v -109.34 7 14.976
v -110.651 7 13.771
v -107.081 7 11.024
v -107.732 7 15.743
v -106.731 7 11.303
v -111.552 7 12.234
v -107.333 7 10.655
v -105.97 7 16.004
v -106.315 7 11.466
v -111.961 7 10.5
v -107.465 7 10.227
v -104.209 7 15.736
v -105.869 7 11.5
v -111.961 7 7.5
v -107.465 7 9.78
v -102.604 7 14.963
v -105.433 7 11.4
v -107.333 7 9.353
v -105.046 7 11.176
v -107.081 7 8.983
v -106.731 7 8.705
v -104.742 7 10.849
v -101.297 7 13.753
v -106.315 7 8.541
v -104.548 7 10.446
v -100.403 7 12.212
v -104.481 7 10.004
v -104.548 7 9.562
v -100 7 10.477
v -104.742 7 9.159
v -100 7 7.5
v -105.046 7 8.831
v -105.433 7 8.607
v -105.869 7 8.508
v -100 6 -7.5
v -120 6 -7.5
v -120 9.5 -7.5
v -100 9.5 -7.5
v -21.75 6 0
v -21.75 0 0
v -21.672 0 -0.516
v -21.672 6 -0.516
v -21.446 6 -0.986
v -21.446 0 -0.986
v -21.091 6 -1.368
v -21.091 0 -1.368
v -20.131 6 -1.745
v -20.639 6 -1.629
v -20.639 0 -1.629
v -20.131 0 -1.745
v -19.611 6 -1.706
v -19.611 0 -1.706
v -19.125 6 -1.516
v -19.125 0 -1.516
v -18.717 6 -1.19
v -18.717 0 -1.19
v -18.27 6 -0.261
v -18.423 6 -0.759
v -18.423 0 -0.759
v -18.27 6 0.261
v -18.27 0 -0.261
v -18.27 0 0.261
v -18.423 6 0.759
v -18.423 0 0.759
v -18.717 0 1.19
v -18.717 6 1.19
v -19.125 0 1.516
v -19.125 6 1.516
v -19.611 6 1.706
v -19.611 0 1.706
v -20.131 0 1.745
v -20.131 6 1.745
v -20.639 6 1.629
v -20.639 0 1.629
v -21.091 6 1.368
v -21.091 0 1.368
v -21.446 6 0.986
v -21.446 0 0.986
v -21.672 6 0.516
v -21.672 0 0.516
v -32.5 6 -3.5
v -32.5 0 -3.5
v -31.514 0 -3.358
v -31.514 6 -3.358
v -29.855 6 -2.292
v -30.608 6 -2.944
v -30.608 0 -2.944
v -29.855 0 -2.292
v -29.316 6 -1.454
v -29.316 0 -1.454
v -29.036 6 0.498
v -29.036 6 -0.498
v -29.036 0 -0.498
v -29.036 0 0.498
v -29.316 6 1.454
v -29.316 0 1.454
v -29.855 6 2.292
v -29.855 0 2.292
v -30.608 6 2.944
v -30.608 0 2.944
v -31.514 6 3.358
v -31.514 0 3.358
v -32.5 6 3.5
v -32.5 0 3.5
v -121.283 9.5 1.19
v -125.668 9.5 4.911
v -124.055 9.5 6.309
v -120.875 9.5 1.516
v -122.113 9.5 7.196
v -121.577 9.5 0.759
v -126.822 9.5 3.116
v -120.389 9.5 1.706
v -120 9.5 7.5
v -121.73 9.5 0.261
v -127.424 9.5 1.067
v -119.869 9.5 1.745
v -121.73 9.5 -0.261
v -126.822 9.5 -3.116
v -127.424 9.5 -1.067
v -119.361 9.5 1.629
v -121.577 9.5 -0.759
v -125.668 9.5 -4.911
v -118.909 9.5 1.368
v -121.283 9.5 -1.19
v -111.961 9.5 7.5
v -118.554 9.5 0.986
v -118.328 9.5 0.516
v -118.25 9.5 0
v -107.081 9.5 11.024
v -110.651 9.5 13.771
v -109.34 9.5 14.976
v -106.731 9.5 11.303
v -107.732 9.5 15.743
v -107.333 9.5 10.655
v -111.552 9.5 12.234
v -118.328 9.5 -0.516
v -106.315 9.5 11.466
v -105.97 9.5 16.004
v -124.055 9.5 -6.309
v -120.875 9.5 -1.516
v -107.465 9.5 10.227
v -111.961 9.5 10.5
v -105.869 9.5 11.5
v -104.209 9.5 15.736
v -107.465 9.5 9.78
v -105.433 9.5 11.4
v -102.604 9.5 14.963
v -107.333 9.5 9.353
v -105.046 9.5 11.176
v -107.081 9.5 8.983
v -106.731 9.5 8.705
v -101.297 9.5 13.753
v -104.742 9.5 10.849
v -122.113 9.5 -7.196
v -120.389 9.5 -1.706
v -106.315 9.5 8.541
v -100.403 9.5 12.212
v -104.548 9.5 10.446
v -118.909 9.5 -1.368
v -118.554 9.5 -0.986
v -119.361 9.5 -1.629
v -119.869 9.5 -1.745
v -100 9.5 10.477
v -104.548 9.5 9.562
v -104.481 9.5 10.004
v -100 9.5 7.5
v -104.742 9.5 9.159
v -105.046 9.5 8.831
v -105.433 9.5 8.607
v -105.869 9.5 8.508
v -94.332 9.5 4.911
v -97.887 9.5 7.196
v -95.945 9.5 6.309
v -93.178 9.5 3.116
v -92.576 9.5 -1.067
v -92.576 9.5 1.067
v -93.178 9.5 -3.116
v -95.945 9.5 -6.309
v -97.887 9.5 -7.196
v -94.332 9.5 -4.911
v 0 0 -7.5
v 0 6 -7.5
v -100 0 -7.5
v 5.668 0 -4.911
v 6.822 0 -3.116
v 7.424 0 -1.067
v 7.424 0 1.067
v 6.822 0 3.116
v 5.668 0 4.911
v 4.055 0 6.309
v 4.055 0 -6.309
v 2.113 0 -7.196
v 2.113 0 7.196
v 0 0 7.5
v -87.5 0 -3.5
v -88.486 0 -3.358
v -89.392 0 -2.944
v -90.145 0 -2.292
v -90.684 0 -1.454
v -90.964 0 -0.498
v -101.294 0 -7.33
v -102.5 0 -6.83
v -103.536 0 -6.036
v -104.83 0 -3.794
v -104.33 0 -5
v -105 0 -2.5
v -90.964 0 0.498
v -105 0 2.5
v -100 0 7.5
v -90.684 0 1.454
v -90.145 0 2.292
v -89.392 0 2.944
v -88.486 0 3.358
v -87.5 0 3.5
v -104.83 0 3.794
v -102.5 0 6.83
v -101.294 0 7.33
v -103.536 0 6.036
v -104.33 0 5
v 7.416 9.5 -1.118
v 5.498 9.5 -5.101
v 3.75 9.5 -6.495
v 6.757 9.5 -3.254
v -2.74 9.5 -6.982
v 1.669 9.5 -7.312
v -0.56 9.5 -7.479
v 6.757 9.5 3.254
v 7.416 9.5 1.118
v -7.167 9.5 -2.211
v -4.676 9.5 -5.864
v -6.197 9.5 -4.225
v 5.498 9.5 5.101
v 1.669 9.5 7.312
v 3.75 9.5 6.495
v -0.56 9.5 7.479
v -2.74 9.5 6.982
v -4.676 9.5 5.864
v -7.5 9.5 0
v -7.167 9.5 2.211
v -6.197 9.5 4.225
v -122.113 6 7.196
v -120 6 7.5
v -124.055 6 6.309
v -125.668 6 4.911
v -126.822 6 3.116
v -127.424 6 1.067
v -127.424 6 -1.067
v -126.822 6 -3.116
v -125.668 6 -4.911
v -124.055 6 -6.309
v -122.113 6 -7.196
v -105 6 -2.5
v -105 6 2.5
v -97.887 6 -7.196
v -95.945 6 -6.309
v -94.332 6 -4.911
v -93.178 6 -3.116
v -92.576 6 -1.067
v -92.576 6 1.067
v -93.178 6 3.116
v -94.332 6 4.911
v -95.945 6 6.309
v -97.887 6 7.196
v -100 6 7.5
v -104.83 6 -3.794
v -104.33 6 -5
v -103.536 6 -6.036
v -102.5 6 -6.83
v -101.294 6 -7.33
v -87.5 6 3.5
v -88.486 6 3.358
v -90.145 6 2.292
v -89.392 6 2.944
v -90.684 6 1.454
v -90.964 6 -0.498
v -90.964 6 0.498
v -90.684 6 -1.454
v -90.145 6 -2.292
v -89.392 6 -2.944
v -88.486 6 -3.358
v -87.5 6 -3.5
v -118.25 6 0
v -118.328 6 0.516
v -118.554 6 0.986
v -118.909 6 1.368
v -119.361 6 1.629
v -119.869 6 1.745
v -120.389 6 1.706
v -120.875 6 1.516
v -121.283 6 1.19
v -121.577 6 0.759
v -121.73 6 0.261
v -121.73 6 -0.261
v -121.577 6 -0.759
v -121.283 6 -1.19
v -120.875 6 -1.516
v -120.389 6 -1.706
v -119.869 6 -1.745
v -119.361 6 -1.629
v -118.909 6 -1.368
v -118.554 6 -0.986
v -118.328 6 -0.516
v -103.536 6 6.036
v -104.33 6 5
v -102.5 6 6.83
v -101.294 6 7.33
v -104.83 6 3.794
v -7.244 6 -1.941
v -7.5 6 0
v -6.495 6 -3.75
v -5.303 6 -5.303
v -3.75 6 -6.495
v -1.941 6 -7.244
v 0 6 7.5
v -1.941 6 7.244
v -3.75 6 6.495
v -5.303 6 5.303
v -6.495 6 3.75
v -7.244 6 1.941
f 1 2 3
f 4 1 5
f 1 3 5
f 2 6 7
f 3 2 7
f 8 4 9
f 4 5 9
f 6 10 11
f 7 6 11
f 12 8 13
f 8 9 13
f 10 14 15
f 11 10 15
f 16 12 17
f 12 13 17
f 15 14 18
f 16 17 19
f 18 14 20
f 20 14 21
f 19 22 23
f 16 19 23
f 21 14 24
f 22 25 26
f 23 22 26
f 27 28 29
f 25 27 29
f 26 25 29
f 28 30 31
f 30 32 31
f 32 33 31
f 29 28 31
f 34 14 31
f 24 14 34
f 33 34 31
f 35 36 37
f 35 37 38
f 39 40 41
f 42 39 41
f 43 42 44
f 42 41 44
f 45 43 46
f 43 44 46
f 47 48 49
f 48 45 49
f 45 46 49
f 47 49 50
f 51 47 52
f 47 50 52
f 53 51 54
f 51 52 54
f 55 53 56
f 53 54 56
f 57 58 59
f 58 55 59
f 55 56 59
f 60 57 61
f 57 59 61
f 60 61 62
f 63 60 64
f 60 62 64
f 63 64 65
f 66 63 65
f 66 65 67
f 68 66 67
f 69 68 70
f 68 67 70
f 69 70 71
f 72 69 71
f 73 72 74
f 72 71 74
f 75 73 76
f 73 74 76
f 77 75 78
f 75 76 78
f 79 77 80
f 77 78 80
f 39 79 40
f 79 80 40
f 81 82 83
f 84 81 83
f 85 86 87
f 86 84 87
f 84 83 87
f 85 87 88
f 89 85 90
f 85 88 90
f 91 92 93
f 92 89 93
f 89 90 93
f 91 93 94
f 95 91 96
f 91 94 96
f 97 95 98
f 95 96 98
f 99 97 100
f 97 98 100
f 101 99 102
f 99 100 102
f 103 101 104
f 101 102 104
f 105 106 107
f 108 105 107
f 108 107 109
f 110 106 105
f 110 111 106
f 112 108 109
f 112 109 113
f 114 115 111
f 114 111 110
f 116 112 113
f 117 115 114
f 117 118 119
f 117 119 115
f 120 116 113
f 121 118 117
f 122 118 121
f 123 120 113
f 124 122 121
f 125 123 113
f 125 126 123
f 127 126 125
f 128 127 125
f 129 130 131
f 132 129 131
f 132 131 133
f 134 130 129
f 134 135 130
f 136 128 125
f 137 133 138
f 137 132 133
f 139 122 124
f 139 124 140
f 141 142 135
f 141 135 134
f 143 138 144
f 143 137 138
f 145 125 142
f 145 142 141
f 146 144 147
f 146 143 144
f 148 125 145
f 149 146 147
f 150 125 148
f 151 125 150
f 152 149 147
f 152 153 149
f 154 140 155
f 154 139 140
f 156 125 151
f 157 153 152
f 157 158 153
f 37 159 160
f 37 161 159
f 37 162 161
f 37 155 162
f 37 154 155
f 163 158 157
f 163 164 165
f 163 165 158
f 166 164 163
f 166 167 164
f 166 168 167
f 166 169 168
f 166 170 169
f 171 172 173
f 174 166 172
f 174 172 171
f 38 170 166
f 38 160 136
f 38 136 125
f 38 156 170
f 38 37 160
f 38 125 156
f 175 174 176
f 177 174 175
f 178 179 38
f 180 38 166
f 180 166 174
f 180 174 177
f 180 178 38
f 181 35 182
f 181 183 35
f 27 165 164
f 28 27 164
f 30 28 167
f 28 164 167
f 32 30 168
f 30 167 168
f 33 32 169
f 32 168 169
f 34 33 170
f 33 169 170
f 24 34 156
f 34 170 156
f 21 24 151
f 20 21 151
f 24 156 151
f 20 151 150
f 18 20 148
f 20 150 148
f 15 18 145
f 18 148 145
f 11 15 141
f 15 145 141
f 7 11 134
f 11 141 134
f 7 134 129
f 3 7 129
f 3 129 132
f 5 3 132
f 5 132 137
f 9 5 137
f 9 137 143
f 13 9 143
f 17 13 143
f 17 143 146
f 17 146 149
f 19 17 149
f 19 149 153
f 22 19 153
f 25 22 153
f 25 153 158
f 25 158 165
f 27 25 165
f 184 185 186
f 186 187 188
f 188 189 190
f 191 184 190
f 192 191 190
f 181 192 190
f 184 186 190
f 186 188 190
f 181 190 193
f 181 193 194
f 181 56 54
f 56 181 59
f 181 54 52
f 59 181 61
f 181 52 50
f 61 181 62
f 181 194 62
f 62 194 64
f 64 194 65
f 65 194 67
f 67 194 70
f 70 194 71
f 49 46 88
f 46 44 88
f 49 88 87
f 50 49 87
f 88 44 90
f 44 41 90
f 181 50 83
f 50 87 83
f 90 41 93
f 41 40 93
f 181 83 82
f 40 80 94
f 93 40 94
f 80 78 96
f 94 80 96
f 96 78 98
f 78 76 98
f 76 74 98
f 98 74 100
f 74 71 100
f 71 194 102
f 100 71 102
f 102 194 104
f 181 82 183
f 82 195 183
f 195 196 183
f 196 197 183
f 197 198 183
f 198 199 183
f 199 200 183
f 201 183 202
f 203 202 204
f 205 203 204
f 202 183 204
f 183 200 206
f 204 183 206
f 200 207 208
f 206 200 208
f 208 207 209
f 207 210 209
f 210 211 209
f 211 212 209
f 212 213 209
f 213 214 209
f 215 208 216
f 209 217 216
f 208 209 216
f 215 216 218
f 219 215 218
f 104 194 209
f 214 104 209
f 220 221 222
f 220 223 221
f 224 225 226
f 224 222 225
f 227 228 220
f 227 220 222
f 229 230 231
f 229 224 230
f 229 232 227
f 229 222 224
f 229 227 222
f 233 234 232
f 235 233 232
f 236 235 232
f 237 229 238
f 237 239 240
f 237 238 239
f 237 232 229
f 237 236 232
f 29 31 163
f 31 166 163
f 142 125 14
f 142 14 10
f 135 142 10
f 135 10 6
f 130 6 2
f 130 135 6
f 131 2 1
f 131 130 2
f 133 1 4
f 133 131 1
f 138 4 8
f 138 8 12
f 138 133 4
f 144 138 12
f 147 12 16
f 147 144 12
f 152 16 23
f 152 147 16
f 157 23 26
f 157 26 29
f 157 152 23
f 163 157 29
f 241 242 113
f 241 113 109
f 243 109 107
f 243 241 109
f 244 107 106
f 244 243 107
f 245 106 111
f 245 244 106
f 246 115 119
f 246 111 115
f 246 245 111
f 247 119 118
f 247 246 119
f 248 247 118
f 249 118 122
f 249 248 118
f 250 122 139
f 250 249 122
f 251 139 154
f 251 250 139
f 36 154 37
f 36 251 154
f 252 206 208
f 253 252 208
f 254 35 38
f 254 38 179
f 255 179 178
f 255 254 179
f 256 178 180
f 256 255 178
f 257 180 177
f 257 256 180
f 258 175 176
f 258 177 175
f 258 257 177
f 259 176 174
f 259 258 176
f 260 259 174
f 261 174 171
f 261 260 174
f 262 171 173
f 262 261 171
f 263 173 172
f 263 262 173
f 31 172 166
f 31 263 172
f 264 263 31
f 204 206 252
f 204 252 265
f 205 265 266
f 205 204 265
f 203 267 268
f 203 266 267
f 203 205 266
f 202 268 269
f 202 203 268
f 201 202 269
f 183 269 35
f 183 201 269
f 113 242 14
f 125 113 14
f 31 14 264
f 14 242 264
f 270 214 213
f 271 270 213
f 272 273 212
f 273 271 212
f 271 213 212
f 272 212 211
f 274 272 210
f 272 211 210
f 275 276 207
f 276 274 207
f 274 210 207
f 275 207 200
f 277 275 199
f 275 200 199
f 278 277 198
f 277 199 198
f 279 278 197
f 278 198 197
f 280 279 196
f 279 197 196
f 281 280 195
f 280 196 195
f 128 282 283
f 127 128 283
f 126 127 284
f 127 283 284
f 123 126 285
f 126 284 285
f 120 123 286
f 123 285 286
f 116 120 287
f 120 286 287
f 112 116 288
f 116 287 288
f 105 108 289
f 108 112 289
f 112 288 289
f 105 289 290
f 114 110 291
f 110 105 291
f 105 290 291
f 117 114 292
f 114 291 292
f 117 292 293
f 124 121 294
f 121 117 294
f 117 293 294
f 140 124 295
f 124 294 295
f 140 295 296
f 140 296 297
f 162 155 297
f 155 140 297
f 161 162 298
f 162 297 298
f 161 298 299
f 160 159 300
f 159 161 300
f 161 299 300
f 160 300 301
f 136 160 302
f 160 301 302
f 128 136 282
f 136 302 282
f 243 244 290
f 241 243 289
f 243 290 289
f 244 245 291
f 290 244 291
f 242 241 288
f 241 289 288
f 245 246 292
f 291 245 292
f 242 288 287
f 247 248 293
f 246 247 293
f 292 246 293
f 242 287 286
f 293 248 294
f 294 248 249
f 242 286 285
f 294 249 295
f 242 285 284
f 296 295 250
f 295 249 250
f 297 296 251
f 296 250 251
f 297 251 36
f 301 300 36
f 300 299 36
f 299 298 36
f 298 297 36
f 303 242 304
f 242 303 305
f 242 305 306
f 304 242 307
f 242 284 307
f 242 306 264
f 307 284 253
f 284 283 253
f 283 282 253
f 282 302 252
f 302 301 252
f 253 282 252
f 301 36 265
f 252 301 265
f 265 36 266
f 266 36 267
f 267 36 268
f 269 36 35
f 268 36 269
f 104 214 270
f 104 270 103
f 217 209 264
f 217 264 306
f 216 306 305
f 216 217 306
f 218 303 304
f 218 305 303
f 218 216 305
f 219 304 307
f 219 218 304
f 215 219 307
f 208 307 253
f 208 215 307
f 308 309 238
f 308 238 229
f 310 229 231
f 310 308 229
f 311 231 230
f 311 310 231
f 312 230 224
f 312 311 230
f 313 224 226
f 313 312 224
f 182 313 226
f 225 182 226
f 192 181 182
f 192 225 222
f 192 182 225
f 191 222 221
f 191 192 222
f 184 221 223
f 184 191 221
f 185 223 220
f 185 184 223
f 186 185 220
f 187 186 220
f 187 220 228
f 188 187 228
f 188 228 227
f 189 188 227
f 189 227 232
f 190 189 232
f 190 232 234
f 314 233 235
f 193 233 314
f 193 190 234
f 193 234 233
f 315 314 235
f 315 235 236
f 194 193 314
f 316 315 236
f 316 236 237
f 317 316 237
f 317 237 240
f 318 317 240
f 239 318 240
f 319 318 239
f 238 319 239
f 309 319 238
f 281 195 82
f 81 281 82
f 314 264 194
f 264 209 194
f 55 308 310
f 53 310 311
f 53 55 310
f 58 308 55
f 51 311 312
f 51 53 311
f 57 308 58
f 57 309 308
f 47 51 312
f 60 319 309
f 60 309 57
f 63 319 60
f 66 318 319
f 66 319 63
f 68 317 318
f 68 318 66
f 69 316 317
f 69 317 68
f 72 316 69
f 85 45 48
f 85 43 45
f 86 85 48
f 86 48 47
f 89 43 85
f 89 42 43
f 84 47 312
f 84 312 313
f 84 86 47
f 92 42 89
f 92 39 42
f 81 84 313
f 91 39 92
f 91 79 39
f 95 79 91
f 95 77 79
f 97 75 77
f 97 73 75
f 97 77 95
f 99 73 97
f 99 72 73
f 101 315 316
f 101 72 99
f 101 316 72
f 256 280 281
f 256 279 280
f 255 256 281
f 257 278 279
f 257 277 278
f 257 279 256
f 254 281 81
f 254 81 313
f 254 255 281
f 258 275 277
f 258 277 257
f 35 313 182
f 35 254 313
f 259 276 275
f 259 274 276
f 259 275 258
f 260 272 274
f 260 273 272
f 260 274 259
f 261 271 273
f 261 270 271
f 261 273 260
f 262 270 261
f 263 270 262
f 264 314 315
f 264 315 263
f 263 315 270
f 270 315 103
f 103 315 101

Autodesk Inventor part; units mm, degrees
ref_plane "YZ Plane" through (0, 0, 0) normal (1, 0, 0) x (0, 1, 0)
ref_plane "XZ Plane" through (0, 0, 0) normal (0, 1, 0) x (-1, 0, 0)
ref_plane "XY Plane" through (0, 0, 0) normal (0, 0, 1) x (1, 0, 0)
sketch "Boceto1" plane through (0, 0, 0) normal (0, 1, 0) x (-1, 0, 0)
  arc A0 (0, 7.5) -> (0, -7.5) centre (0, 0) ccw
  circle A1 centre (20, 0) radius 1.75
  arc A2 (32.5, 3.5) -> (32.5, -3.5) centre (32.5, 0) ccw
  arc A3 (87.5, -3.5) -> (87.5, 3.5) centre (87.5, 0) ccw
  line L0 (100, 7.5) -> (0, 7.5)
  line L1 (100, -7.5) -> (0, -7.5)
  arc A4 (105, 2.5) -> (100, 7.5) centre (100, 2.5) ccw
  arc A5 (100, -7.5) -> (105, -2.5) centre (100, -2.5) ccw
  circle A6 centre (120, 0) radius 1.75
  arc A7 (120, -7.5) -> (120, 7.5) centre (120, 0) ccw
  line L2 (120, 7.5) -> (100, 7.5)
  line L3 (120, -7.5) -> (100, -7.5)
  line L4 (105, -2.5) -> (105, 2.5)
  line L5 (100, -7.5) -> (100, -10.5)
  circle A8 centre (103, -10.5) radius 1.5
  arc A9 (100, -10.5) -> (106, -10.5) centre (103, -10.5) ccw
  line L6 (106, -10.5) -> (106, -7.5)
  circle A10 centre (0, 0) radius 7.5
  line L7 (87.5, 3.5) -> (32.5, 3.5)
  line L8 (87.5, -3.5) -> (32.5, -3.5)
  point P0 (0, -7.5)
  point P1 (0, 7.5)
  point P2 (0, 7.5)
  point P3 (0, -7.5)
  dimension "d0" = 15
  dimension "d2" = 3.5
  dimension "d6" = 7
  dimension "d7" = 7
  dimension "d16" = 3.5
  dimension "d18" = 3
  dimension "d20" = 3
  dimension "d22" = 3
  dimension "d23" = 15
  dimension "d24" = 55
  dimension "d25" = 55
extrude "Extrusión1" add sketch "Boceto1" along normal blind 9.5 contours A10 A0
extrude "Extrusión2" add sketch "Boceto1" along normal blind 6 contours L0 A4 L4 A5 L1 A10
sketch "Boceto2" plane through (0, 6, 0) normal (0, 1, 0) x (1, 0, 0)
  line L0 (-100, -7.5) -> (0, -7.5) projected
  arc A0 (0, 7.5) -> (0, -7.5) centre (0, 0) ccw projected
  line L1 (0, 7.5) -> (-100, 7.5) projected
  arc A1 (-100, 7.5) -> (-105, 2.5) centre (-100, 2.5) ccw projected
  line L2 (-105, 2.5) -> (-105, -2.5) projected
  arc A2 (-105, -2.5) -> (-100, -7.5) centre (-100, -2.5) ccw projected
  circle A3 centre (-20, 0) radius 1.75 projected
  line L3 (-87.5, 3.5) -> (-32.5, 3.5) projected
  arc A4 (-32.5, -3.5) -> (-32.5, 3.5) centre (-32.5, 0) ccw projected
  line L4 (-32.5, -3.5) -> (-87.5, -3.5) projected
  arc A5 (-87.5, 3.5) -> (-87.5, -3.5) centre (-87.5, 0) ccw projected
  arc A6 (-120, 7.5) -> (-120, -7.5) centre (-120, 0) ccw
  line L5 (-120, -7.5) -> (-100, -7.5)
  line L6 (-120, 7.5) -> (-100, 7.5)
  arc A7 (-100, -7.5) -> (-100, 7.5) centre (-100, 0) ccw
  line L7 (-100, -7.5) -> (0, -7.5) projected
  line L8 (-100, -7.5) -> (-100, -10.5)
  circle A8 centre (-103, -10.5) radius 1.5
  arc A9 (-106, -10.5) -> (-100, -10.5) centre (-103, -10.5) ccw
  line L9 (-106, -10.5) -> (-106, -7.5)
  circle A10 centre (-120, 0) radius 1.75
  dimension "d31" = 15
  dimension "d32" = 20
  dimension "d33" = 20
  dimension "d35" = 3
  dimension "d39" = 3
  dimension "d40" = 3.5
extrude "Extrusión3" add sketch "Boceto2" along normal blind 3.5 contours L5 A6 L6 A1 L2 A2 | A2 L2 A1 A7
sketch "Boceto3" plane through (0, 9.5, 0) normal (0, 1, 0) x (1, 0, 0)
  line L0 (-105, 2.5) -> (-105, -2.5) projected
  line L1 (-120, -7.5) -> (-100, -7.5) projected
  arc A0 (-100, -7.5) -> (-100, 7.5) centre (-100, 0) ccw projected
  line L2 (-100, 7.5) -> (-120, 7.5) projected
  arc A1 (-120, 7.5) -> (-120, -7.5) centre (-120, 0) ccw projected
  circle A2 centre (-120, 0) radius 1.75 projected
  arc A3 (-100, -7.5) -> (-100, 7.5) centre (-100, 0) ccw projected
  line L3 (-100, -7.5) -> (0, -7.5) projected
  arc A4 (0, 7.5) -> (0, -7.5) centre (0, 0) ccw projected
  line L4 (0, 7.5) -> (-100, 7.5) projected
  circle A5 centre (-20, 0) radius 1.75 projected
  line L5 (-87.5, 3.5) -> (-32.5, 3.5) projected
  arc A6 (-32.5, -3.5) -> (-32.5, 3.5) centre (-32.5, 0) ccw projected
  line L6 (-32.5, -3.5) -> (-87.5, -3.5) projected
  arc A7 (-87.5, 3.5) -> (-87.5, -3.5) centre (-87.5, 0) ccw projected
  line L7 (-100, -7.5) -> (-100, -10.4769)
  line L8 (-120, -7.5) -> (-100, -7.5) projected
  line L9 (-106, -7.5) -> (-100, -7.5)
  line L10 (-111.9608, -7.5) -> (-111.9608, -10.5)
  arc A8 (-111.9608, -10.5) -> (-100, -10.4769) centre (-105.9813, -10.0037) ccw
  circle A9 centre (-105.9813, -10.0037) radius 1.5
  dimension "d52" = 3
  dimension "d53" = 6
  dimension "d54" = 3
extrude "Extrusión4" add sketch "Boceto3" against normal blind 2.5 contours L1 L7 A8 L10
properties part number "pieza4parte3"
